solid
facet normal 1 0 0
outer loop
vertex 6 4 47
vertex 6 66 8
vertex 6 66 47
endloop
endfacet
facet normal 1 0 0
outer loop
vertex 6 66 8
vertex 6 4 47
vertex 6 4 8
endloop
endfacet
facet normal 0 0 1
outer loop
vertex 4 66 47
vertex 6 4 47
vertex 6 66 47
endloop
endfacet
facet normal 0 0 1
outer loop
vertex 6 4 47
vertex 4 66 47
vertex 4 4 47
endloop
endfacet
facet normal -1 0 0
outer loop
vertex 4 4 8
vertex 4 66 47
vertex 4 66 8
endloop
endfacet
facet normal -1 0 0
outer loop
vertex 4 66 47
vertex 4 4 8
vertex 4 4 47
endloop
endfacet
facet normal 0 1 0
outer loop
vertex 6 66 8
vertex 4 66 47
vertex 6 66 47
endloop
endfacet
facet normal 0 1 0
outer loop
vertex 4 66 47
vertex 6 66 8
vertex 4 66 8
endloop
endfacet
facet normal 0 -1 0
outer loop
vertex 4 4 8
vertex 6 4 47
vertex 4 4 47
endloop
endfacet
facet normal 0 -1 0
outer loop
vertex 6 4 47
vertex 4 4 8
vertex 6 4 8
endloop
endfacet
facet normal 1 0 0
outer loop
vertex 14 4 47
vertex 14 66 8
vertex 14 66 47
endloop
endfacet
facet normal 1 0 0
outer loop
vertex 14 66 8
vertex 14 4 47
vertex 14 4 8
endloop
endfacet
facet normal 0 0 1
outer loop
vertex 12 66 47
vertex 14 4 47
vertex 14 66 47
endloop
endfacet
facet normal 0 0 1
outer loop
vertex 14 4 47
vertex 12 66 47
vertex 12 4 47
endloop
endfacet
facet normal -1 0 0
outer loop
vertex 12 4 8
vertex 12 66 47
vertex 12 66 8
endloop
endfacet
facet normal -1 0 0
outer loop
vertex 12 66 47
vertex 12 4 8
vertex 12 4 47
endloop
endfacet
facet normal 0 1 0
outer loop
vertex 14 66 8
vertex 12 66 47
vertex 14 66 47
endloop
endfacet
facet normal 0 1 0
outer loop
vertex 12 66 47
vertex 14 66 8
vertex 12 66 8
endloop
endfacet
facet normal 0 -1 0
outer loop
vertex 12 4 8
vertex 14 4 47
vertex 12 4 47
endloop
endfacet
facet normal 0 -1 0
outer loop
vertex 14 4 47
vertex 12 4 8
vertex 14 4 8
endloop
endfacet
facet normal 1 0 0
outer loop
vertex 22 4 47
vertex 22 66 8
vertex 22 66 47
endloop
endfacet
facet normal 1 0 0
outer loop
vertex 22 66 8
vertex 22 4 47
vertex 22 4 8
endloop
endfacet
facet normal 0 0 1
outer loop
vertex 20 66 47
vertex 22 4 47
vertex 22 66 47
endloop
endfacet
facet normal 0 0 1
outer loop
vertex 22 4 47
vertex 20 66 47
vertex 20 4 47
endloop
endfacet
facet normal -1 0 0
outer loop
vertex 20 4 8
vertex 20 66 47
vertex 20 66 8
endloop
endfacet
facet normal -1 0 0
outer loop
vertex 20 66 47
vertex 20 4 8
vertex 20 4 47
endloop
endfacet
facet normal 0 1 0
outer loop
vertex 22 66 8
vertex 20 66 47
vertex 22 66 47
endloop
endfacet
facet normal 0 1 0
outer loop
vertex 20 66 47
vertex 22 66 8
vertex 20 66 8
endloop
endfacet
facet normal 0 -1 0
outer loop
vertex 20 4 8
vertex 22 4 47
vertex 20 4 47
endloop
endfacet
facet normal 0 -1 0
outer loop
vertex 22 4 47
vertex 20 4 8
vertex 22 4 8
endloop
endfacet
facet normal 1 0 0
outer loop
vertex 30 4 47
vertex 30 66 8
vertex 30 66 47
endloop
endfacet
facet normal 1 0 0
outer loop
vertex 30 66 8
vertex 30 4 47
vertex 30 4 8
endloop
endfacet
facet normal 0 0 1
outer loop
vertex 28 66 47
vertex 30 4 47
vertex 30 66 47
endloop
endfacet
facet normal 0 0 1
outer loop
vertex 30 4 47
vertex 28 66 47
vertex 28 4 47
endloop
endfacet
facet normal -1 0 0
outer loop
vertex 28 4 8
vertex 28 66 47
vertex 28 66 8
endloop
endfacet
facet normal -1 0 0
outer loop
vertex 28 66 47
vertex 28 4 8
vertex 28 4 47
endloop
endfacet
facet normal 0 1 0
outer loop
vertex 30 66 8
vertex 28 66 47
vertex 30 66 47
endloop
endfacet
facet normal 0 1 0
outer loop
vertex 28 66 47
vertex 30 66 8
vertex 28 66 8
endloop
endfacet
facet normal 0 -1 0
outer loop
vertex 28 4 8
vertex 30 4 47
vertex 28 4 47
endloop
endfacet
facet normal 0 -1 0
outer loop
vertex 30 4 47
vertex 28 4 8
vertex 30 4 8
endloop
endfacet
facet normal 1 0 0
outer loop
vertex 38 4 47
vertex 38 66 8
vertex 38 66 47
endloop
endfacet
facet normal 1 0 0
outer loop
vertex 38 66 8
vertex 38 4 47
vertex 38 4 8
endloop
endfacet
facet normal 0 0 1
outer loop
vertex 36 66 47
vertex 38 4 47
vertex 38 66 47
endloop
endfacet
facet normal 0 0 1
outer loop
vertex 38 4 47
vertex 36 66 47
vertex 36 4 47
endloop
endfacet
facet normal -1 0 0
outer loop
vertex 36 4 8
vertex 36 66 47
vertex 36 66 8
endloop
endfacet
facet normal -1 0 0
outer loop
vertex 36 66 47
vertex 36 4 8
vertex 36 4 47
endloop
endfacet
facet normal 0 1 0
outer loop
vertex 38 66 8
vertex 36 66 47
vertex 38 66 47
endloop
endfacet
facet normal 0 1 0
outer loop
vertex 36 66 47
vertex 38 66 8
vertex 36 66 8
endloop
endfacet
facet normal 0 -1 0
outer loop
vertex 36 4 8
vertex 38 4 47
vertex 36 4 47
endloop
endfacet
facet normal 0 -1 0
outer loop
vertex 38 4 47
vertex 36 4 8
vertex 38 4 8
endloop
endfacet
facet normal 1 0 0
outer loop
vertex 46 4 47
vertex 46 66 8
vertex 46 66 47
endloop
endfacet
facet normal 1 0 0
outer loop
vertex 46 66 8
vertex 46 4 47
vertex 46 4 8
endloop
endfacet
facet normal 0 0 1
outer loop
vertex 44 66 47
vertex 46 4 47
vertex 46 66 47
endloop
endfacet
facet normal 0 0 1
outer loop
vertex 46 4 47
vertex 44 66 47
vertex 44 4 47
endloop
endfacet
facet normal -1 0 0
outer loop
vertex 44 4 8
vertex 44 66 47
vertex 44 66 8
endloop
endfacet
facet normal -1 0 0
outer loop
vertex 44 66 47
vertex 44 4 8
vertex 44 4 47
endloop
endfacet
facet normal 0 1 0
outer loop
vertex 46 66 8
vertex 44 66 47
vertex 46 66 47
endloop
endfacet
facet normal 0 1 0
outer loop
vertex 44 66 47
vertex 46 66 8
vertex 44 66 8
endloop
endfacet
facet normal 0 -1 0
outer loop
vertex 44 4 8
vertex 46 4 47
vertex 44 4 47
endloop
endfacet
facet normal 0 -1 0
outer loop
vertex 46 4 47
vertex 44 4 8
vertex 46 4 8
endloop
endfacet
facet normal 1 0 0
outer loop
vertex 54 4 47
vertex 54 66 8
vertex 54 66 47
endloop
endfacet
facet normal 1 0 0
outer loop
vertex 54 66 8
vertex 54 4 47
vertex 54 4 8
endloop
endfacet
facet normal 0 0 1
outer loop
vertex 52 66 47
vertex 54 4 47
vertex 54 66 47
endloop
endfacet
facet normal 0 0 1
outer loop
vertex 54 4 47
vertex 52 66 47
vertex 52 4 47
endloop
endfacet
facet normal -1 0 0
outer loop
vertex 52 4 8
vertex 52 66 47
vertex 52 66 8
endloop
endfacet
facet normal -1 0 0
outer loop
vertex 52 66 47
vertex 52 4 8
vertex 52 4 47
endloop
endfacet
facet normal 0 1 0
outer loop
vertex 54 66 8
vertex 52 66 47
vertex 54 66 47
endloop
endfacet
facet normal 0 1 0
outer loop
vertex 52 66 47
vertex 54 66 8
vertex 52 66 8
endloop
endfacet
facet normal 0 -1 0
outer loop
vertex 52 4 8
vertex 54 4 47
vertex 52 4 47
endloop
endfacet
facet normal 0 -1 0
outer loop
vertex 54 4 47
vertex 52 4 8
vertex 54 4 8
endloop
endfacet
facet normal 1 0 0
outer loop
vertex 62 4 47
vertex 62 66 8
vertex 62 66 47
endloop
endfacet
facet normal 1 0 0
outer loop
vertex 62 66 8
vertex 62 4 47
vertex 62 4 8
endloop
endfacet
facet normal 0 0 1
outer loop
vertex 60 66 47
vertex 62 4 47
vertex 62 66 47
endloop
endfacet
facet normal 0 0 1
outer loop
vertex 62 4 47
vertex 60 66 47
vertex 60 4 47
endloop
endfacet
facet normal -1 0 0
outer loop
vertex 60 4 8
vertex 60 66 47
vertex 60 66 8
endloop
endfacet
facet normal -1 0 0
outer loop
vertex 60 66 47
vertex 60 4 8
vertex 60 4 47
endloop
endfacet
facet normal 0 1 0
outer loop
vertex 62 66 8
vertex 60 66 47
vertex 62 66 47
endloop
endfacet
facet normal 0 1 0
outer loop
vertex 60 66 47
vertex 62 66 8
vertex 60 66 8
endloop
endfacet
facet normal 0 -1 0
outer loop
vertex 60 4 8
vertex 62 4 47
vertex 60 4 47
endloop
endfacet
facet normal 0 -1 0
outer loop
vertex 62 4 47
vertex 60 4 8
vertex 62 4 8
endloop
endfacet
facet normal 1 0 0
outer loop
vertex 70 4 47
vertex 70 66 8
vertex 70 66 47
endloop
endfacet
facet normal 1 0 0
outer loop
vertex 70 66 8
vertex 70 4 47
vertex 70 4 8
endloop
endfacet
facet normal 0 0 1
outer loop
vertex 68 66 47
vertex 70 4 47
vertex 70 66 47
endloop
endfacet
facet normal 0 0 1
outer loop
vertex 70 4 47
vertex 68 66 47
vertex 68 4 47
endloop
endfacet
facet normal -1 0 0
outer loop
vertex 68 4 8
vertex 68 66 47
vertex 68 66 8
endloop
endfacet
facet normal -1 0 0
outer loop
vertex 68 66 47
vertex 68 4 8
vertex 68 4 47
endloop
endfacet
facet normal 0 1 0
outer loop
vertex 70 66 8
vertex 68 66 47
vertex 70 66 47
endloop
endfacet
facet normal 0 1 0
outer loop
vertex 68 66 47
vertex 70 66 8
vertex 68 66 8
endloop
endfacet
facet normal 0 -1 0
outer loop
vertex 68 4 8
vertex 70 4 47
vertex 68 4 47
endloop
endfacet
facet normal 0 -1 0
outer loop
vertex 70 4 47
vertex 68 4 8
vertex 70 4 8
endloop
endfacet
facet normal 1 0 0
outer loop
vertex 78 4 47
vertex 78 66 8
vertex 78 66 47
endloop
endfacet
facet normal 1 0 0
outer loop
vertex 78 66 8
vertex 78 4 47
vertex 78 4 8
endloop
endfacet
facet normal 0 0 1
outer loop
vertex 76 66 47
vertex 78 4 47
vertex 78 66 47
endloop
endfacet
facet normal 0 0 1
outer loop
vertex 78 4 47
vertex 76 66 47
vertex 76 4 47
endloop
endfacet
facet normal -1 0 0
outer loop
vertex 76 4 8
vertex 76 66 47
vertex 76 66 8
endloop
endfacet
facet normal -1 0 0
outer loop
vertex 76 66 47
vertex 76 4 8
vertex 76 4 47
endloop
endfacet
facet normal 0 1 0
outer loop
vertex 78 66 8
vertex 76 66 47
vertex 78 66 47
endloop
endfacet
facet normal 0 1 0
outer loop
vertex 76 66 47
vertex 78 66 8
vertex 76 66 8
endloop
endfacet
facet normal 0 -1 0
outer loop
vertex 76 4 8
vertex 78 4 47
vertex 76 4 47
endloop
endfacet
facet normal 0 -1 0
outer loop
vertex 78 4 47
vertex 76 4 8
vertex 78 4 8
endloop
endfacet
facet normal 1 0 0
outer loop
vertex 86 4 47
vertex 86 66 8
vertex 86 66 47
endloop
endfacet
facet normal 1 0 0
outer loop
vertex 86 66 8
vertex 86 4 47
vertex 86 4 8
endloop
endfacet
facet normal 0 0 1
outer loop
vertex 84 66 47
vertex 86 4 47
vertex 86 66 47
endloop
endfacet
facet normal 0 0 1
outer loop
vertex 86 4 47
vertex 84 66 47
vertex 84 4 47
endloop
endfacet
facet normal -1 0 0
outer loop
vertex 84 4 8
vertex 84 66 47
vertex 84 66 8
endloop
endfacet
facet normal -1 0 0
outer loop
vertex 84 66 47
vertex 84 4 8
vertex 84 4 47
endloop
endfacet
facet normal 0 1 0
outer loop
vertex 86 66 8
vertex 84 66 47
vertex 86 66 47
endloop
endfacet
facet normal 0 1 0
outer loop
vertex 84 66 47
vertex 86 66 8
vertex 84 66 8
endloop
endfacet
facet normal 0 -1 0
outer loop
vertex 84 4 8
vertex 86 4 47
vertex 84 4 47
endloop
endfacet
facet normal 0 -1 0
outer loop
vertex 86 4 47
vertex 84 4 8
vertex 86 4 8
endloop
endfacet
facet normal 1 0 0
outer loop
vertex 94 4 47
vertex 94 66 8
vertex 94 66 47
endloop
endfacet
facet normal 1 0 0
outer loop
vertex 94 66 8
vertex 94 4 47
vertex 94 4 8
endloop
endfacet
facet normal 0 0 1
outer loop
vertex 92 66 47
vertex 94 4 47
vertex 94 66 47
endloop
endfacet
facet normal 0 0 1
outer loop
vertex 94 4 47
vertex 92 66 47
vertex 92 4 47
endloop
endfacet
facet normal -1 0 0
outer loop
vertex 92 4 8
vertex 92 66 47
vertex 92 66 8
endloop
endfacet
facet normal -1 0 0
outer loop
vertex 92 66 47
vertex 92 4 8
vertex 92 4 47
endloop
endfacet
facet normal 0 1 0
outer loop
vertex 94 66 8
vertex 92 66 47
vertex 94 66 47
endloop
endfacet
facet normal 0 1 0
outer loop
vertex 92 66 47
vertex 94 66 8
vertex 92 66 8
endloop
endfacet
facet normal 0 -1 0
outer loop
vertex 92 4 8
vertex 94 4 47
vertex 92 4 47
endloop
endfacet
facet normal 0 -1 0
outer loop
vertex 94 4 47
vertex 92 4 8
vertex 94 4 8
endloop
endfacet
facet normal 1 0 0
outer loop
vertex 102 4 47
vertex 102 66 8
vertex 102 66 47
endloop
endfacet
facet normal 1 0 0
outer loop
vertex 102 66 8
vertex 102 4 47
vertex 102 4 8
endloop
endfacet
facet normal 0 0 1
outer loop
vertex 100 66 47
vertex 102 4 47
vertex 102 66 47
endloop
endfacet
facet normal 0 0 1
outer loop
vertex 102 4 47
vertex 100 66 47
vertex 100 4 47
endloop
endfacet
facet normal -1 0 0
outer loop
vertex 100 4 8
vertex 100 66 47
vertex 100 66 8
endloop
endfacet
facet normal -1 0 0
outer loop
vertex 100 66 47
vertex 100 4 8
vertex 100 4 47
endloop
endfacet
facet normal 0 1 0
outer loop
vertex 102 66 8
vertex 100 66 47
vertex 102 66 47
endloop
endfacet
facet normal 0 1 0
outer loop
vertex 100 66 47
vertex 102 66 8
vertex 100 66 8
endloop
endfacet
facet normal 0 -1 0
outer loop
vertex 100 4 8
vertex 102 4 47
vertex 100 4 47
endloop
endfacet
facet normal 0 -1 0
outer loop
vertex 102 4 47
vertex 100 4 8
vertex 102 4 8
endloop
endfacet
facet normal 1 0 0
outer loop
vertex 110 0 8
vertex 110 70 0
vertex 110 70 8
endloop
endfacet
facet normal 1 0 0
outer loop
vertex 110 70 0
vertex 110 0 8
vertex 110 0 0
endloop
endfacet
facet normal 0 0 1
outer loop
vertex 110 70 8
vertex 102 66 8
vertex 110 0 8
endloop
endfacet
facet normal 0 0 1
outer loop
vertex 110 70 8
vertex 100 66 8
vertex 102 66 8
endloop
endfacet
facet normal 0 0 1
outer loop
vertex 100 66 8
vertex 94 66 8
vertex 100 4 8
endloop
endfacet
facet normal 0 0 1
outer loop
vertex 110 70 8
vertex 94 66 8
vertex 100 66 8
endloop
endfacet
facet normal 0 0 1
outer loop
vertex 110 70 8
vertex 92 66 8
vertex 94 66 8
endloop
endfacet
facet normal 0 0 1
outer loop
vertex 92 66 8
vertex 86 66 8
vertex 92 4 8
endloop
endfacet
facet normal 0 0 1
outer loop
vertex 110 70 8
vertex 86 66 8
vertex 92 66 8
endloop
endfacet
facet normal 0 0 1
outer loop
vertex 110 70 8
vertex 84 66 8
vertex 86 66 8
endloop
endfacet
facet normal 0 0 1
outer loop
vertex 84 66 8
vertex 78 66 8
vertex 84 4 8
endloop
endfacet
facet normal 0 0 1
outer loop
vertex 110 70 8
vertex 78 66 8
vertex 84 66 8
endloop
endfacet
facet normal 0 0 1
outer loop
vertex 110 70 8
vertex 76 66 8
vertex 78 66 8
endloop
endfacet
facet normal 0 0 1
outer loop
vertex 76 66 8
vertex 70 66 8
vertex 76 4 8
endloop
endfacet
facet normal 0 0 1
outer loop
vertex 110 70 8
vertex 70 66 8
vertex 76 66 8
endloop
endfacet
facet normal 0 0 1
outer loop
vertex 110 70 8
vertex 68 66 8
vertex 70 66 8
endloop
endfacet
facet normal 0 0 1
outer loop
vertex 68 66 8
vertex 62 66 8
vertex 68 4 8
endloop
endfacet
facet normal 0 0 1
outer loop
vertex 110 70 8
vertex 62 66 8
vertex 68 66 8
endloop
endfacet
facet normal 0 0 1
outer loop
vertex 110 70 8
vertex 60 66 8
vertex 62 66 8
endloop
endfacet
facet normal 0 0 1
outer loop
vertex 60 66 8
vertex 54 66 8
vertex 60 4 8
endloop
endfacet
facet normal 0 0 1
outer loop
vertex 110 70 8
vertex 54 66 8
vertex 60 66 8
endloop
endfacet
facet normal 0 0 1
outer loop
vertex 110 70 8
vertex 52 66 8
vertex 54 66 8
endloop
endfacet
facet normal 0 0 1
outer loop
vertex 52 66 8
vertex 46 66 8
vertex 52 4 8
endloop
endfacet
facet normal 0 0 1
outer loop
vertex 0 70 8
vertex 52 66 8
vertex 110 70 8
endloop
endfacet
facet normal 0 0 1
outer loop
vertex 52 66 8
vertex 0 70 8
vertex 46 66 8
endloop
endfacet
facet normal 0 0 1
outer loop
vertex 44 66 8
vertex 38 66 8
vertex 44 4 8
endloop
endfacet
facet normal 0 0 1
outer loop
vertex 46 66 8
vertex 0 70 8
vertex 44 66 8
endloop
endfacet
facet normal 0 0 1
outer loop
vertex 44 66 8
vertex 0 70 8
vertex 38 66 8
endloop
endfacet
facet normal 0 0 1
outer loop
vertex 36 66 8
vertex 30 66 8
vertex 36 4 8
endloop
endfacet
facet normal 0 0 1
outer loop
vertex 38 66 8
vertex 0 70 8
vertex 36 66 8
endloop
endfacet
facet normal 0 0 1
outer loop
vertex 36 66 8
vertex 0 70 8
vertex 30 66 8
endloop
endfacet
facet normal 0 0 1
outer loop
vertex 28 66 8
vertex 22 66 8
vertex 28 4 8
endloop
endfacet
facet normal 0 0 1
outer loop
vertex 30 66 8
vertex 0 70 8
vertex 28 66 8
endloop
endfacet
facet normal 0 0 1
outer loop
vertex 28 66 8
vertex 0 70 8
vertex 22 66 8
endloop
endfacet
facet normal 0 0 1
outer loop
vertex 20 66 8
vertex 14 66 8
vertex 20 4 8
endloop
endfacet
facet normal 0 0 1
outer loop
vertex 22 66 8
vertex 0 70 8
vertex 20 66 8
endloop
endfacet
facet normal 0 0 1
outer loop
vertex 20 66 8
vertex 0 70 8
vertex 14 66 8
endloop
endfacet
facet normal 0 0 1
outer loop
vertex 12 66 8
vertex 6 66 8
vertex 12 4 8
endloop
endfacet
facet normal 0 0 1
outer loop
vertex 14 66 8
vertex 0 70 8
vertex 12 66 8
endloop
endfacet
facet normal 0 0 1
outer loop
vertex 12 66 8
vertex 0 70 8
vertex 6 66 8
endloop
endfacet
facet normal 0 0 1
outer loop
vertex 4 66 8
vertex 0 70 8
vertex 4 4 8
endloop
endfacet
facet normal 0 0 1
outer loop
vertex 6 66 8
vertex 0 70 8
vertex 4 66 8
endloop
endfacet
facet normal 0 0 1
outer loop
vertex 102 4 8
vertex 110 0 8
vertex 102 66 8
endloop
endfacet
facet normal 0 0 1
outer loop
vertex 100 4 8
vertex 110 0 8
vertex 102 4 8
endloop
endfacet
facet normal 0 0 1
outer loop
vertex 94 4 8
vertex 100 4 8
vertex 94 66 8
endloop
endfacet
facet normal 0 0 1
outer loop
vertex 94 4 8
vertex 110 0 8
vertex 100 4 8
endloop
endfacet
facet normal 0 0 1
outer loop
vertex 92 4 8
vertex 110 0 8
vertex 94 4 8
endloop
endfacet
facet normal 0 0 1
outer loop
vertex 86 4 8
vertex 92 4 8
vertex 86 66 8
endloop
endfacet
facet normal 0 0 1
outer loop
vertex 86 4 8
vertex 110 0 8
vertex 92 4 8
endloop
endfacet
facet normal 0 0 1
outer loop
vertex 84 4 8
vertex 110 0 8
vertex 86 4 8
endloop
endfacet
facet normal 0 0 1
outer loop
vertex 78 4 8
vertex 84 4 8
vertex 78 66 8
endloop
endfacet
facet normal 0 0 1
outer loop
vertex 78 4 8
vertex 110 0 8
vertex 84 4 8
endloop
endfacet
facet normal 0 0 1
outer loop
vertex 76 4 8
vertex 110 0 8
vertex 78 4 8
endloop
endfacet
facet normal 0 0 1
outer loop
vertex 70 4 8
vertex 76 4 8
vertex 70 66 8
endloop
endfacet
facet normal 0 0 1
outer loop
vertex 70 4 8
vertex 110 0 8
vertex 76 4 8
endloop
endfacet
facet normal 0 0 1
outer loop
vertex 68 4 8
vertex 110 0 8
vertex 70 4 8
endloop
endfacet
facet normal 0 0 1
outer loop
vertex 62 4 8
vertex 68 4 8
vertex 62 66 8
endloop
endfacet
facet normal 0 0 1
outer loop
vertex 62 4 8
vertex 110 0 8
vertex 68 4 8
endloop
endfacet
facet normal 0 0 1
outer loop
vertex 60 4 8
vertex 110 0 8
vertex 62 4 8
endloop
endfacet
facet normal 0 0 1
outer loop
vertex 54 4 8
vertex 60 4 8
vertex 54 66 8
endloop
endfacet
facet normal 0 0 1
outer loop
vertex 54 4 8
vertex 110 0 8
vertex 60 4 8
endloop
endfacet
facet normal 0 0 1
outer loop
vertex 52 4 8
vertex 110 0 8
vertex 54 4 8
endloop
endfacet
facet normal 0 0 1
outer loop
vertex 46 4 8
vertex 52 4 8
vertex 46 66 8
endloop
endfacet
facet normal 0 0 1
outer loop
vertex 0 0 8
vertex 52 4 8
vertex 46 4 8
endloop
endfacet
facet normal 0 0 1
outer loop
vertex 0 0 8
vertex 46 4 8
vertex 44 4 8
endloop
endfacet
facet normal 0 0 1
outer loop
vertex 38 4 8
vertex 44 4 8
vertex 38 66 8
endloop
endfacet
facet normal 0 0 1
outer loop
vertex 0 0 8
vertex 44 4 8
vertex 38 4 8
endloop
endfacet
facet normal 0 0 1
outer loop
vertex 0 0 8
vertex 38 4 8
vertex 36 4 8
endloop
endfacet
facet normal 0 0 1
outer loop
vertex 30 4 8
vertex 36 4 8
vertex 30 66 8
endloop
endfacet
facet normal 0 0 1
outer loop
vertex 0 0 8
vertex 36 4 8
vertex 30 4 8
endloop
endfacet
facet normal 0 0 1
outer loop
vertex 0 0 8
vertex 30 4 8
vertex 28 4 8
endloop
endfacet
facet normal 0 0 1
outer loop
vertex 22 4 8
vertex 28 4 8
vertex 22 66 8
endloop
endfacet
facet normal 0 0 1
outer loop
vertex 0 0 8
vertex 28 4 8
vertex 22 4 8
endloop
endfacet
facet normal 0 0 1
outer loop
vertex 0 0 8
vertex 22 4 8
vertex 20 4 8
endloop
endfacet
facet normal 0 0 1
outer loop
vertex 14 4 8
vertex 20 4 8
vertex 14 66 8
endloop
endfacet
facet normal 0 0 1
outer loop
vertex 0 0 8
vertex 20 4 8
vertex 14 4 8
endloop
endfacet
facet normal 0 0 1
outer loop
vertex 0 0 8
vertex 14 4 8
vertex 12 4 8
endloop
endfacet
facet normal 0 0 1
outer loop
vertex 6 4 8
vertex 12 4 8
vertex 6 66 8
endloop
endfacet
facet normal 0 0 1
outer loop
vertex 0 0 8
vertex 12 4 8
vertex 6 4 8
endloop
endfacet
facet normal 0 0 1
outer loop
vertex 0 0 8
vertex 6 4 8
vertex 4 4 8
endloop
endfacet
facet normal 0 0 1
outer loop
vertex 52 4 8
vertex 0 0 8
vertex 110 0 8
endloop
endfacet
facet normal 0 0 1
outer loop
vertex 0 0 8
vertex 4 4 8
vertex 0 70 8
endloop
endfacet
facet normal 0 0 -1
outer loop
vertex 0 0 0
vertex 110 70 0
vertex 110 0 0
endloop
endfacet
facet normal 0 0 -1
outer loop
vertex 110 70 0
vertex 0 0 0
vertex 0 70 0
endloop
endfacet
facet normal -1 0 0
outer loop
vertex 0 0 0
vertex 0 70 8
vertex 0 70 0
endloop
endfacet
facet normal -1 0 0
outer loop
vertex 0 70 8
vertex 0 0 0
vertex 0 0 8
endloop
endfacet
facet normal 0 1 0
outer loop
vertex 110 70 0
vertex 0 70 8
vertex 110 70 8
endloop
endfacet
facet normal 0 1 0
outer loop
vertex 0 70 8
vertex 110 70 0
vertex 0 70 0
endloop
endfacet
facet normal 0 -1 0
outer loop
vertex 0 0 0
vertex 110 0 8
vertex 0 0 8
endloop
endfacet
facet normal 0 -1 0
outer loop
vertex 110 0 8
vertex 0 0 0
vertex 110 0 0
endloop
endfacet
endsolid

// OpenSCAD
$fn = 32;

// ----------------------------------------------------------------------
// Heatsink: uniform fin block
// ----------------------------------------------------------------------

// --- parameters (mm) ---
base_l = 110;             // base length, X
base_w = 70;              // base width, Y
base_t = 8;               // base plate thickness
fin_h = 40;               // fin height above the base
fin_t = 2;                // fin thickness
edge = 4;                 // margin from the base ends
pitch = 8;                // fin pitch
fit_tol = 0.05;           // tolerance for press fits, mm
free_tol = 0.2;           // tolerance for clearance fits, mm

n_fins = floor((base_l - 2 * edge - fin_t) / pitch) + 1;  // fin count
total_h = base_t + fin_h - 1;  // overall height

union() {
  cube([base_l, base_w, base_t]);
  for (i = [0 : n_fins - 1])
    translate([edge + i * pitch, edge, base_t - 1])
      cube([fin_t, base_w - 2 * edge, fin_h]);
}
